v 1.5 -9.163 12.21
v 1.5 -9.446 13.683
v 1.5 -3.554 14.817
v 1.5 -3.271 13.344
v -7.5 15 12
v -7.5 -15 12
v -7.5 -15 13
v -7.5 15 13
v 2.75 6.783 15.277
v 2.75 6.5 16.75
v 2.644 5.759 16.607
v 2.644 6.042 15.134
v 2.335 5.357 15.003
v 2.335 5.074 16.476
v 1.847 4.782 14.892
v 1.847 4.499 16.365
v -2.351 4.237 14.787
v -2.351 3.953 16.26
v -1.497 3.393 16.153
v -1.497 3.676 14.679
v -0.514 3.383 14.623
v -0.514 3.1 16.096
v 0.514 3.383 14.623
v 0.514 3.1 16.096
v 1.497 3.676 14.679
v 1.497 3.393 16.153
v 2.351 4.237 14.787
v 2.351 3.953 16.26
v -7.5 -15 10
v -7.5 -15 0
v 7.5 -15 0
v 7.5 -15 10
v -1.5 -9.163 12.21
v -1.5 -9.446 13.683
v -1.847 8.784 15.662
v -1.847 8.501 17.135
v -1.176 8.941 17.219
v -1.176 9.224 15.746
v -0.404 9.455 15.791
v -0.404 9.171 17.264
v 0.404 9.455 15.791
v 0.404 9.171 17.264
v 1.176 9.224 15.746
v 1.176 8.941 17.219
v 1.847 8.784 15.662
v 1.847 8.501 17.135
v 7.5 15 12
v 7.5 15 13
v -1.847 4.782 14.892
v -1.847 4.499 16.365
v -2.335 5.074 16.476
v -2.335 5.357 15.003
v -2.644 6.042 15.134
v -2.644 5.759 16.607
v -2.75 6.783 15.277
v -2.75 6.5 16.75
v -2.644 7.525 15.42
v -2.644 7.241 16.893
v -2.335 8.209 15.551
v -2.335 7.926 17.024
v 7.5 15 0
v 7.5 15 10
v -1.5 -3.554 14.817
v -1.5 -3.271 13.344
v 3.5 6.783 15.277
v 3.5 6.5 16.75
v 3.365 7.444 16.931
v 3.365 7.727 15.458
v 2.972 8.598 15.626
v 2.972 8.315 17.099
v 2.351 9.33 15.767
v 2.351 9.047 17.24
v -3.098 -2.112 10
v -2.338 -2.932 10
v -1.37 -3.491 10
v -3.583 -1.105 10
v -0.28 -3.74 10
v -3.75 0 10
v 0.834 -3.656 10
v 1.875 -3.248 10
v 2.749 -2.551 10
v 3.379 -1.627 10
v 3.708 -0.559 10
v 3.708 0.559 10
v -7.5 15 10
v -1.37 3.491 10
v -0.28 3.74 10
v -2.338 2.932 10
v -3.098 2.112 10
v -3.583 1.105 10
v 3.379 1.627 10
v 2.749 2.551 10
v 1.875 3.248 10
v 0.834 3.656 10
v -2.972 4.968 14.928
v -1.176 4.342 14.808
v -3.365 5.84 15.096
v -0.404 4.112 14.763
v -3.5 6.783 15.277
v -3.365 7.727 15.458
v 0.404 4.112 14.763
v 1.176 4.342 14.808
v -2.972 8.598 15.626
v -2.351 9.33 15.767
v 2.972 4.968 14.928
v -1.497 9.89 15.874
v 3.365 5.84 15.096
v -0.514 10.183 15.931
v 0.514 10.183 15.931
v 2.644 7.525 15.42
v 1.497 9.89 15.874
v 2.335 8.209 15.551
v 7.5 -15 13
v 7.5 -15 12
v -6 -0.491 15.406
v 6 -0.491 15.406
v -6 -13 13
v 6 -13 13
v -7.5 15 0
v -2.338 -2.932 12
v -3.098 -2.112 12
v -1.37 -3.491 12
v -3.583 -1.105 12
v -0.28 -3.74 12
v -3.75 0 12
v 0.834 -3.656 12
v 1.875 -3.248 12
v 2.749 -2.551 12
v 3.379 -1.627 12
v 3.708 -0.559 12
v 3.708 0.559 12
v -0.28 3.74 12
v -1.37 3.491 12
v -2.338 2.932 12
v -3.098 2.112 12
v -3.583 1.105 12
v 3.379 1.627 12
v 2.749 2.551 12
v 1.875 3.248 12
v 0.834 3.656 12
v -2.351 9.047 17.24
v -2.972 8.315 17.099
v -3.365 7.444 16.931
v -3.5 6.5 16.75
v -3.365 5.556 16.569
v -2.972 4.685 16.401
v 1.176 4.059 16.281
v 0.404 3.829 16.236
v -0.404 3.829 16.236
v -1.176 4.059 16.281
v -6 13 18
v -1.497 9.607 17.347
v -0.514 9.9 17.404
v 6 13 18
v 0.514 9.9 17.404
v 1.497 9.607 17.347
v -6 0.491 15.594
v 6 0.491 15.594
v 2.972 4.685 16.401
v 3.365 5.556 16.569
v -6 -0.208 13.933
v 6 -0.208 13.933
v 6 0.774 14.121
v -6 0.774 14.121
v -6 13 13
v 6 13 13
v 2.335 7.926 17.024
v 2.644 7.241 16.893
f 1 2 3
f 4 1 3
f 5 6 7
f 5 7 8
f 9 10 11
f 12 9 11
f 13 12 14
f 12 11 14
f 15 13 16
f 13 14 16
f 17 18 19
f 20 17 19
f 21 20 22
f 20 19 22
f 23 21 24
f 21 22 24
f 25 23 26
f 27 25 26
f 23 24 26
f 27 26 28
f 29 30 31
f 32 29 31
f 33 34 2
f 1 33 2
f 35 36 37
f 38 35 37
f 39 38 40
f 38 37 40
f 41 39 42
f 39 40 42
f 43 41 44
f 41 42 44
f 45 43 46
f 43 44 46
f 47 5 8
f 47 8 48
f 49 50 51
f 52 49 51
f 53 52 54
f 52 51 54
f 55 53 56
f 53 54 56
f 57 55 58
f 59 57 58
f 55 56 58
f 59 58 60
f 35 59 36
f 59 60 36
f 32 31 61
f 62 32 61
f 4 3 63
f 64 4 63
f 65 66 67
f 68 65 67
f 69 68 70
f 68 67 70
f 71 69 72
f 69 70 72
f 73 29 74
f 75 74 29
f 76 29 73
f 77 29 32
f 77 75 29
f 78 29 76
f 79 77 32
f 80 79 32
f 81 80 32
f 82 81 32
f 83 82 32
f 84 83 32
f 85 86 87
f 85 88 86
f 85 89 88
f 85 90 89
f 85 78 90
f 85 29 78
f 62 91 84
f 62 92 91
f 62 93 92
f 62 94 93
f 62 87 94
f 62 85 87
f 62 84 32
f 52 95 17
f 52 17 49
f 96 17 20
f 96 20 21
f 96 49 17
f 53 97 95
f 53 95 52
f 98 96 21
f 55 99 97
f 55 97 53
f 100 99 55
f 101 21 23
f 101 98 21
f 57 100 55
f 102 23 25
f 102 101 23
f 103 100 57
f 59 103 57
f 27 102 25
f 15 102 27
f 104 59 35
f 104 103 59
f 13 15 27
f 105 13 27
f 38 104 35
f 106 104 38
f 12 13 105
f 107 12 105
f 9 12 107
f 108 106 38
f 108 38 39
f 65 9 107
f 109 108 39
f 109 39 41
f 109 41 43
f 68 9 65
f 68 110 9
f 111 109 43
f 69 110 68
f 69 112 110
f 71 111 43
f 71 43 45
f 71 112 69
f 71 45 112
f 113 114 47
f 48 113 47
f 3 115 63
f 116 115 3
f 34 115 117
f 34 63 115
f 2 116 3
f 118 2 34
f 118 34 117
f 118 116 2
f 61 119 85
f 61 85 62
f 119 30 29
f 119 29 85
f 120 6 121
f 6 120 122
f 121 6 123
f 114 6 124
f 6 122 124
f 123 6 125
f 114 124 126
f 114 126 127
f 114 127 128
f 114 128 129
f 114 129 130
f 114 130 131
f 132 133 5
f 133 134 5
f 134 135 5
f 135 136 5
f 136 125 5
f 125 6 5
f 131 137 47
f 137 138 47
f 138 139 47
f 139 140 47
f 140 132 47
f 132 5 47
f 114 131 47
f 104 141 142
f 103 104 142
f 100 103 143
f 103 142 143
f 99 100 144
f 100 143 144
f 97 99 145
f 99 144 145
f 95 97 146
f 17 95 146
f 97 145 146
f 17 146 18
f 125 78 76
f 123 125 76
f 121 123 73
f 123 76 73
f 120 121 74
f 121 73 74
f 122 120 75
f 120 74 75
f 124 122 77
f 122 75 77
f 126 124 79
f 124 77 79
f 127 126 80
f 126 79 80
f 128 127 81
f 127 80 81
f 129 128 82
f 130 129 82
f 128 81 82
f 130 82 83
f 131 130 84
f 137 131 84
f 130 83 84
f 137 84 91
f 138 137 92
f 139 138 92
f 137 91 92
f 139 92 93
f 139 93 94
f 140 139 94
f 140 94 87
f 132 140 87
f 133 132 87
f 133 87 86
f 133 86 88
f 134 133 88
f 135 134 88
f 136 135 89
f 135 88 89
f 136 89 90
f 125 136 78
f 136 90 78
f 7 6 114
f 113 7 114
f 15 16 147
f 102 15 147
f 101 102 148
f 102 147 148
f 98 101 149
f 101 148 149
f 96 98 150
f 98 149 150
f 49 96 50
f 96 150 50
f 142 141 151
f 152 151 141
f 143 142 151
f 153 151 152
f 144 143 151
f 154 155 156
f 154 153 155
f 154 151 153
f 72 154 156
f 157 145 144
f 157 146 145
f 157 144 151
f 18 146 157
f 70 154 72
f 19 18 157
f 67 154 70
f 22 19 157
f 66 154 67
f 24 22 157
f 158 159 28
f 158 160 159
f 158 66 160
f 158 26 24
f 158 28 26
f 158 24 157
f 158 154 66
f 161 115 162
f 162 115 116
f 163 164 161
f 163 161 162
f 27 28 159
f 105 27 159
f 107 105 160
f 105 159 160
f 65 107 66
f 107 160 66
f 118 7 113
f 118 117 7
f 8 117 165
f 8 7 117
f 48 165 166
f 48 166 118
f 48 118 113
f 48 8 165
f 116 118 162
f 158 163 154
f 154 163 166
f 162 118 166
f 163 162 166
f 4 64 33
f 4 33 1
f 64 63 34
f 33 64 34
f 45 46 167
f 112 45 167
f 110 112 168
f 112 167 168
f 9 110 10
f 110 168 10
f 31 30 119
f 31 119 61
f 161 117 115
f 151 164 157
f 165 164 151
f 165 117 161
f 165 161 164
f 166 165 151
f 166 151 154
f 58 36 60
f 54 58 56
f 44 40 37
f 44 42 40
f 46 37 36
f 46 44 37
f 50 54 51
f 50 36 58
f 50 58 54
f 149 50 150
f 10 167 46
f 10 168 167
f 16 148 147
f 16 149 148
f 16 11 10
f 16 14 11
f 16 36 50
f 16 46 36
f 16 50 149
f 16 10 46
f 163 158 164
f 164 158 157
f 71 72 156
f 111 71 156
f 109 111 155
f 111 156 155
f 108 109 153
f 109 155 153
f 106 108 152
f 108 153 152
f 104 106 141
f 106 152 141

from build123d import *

# Parameters (mm, degrees)
CROQUIS1_W              = 15
CROQUIS1_H              = 30
SALIENTE_EXTRUIR1_DEPTH = 10
CROQUIS2_R              = 3.75
SALIENTE_EXTRUIR2_DEPTH = 2
CROQUIS3_W              = 15
CROQUIS3_H              = 30
SALIENTE_EXTRUIR3_DEPTH = 1
CROQUIS4_W              = 12
CROQUIS4_H              = 26
SALIENTE_EXTRUIR4_DEPTH = 5
CORTAR_EXTRUIR1_DEPTH   = 12
CROQUIS6_W              = 12
CROQUIS6_H              = 1
CROQUIS6_R              = 3.5
CROQUIS6_R_2            = 2.75
CROQUIS6_W_2            = 3
CROQUIS6_H_2            = 6
CORTAR_EXTRUIR2_DEPTH   = 1.5


with BuildPart() as part:
    # Croquis1 → Saliente-Extruir1 (new body)
    with BuildSketch(Plane.XY):
        Rectangle(CROQUIS1_W, CROQUIS1_H)
    extrude(amount=SALIENTE_EXTRUIR1_DEPTH)

    # Croquis2 → Saliente-Extruir2 (add)
    with BuildSketch(Plane.XY.offset(10)):
        Circle(CROQUIS2_R)
    extrude(amount=SALIENTE_EXTRUIR2_DEPTH)

    # Croquis3 → Saliente-Extruir3 (add)
    with BuildSketch(Plane.XY.offset(12)):
        Rectangle(CROQUIS3_W, CROQUIS3_H)
    extrude(amount=SALIENTE_EXTRUIR3_DEPTH)

    # Croquis4 → Saliente-Extruir4 (add)
    with BuildSketch(Plane.XY.offset(13)):
        Rectangle(CROQUIS4_W, CROQUIS4_H)
    extrude(amount=SALIENTE_EXTRUIR4_DEPTH)

    # Croquis5 → Cortar-Extruir1 (cut)
    with BuildSketch(Plane(origin=(6, 0, 0), x_dir=(0, 0, -1), z_dir=(1, 0, 0))):
        Polygon((-18, 13), (-13, -13), (-18, -13), align=None)
    extrude(amount=-CORTAR_EXTRUIR1_DEPTH, mode=Mode.SUBTRACT)

    # Croquis6 → Cortar-Extruir2 (cut)
    # profile 1 of 3: a face of its own
    with BuildSketch(Plane(origin=(0, -2.87446505, 14.94721826), x_dir=(1, 0, 0), z_dir=(0, -0.18884739365012454, 0.9820064469806473))):
        with Locations((0, 2.927134602)):
            Rectangle(CROQUIS6_W, CROQUIS6_H)
    # profile 2 of 3: a face of its own
    with BuildSketch(Plane(origin=(0, -2.87446505, 14.94721826), x_dir=(1, 0, 0), z_dir=(0, -0.18884739365012454, 0.9820064469806473))):
        with Locations((0, 9.546235749)):
            Circle(CROQUIS6_R)
        with Locations((0, 9.546235749)):
            Circle(CROQUIS6_R_2, mode=Mode.SUBTRACT)
    # profile 3 of 3: a face of its own
    with BuildSketch(Plane(origin=(0, -2.87446505, 14.94721826), x_dir=(1, 0, 0), z_dir=(0, -0.18884739365012454, 0.9820064469806473))):
        with Locations((0, -3.691966546)):
            Rectangle(CROQUIS6_W_2, CROQUIS6_H_2)
    extrude(amount=-CORTAR_EXTRUIR2_DEPTH, mode=Mode.SUBTRACT)


solid = part.part
